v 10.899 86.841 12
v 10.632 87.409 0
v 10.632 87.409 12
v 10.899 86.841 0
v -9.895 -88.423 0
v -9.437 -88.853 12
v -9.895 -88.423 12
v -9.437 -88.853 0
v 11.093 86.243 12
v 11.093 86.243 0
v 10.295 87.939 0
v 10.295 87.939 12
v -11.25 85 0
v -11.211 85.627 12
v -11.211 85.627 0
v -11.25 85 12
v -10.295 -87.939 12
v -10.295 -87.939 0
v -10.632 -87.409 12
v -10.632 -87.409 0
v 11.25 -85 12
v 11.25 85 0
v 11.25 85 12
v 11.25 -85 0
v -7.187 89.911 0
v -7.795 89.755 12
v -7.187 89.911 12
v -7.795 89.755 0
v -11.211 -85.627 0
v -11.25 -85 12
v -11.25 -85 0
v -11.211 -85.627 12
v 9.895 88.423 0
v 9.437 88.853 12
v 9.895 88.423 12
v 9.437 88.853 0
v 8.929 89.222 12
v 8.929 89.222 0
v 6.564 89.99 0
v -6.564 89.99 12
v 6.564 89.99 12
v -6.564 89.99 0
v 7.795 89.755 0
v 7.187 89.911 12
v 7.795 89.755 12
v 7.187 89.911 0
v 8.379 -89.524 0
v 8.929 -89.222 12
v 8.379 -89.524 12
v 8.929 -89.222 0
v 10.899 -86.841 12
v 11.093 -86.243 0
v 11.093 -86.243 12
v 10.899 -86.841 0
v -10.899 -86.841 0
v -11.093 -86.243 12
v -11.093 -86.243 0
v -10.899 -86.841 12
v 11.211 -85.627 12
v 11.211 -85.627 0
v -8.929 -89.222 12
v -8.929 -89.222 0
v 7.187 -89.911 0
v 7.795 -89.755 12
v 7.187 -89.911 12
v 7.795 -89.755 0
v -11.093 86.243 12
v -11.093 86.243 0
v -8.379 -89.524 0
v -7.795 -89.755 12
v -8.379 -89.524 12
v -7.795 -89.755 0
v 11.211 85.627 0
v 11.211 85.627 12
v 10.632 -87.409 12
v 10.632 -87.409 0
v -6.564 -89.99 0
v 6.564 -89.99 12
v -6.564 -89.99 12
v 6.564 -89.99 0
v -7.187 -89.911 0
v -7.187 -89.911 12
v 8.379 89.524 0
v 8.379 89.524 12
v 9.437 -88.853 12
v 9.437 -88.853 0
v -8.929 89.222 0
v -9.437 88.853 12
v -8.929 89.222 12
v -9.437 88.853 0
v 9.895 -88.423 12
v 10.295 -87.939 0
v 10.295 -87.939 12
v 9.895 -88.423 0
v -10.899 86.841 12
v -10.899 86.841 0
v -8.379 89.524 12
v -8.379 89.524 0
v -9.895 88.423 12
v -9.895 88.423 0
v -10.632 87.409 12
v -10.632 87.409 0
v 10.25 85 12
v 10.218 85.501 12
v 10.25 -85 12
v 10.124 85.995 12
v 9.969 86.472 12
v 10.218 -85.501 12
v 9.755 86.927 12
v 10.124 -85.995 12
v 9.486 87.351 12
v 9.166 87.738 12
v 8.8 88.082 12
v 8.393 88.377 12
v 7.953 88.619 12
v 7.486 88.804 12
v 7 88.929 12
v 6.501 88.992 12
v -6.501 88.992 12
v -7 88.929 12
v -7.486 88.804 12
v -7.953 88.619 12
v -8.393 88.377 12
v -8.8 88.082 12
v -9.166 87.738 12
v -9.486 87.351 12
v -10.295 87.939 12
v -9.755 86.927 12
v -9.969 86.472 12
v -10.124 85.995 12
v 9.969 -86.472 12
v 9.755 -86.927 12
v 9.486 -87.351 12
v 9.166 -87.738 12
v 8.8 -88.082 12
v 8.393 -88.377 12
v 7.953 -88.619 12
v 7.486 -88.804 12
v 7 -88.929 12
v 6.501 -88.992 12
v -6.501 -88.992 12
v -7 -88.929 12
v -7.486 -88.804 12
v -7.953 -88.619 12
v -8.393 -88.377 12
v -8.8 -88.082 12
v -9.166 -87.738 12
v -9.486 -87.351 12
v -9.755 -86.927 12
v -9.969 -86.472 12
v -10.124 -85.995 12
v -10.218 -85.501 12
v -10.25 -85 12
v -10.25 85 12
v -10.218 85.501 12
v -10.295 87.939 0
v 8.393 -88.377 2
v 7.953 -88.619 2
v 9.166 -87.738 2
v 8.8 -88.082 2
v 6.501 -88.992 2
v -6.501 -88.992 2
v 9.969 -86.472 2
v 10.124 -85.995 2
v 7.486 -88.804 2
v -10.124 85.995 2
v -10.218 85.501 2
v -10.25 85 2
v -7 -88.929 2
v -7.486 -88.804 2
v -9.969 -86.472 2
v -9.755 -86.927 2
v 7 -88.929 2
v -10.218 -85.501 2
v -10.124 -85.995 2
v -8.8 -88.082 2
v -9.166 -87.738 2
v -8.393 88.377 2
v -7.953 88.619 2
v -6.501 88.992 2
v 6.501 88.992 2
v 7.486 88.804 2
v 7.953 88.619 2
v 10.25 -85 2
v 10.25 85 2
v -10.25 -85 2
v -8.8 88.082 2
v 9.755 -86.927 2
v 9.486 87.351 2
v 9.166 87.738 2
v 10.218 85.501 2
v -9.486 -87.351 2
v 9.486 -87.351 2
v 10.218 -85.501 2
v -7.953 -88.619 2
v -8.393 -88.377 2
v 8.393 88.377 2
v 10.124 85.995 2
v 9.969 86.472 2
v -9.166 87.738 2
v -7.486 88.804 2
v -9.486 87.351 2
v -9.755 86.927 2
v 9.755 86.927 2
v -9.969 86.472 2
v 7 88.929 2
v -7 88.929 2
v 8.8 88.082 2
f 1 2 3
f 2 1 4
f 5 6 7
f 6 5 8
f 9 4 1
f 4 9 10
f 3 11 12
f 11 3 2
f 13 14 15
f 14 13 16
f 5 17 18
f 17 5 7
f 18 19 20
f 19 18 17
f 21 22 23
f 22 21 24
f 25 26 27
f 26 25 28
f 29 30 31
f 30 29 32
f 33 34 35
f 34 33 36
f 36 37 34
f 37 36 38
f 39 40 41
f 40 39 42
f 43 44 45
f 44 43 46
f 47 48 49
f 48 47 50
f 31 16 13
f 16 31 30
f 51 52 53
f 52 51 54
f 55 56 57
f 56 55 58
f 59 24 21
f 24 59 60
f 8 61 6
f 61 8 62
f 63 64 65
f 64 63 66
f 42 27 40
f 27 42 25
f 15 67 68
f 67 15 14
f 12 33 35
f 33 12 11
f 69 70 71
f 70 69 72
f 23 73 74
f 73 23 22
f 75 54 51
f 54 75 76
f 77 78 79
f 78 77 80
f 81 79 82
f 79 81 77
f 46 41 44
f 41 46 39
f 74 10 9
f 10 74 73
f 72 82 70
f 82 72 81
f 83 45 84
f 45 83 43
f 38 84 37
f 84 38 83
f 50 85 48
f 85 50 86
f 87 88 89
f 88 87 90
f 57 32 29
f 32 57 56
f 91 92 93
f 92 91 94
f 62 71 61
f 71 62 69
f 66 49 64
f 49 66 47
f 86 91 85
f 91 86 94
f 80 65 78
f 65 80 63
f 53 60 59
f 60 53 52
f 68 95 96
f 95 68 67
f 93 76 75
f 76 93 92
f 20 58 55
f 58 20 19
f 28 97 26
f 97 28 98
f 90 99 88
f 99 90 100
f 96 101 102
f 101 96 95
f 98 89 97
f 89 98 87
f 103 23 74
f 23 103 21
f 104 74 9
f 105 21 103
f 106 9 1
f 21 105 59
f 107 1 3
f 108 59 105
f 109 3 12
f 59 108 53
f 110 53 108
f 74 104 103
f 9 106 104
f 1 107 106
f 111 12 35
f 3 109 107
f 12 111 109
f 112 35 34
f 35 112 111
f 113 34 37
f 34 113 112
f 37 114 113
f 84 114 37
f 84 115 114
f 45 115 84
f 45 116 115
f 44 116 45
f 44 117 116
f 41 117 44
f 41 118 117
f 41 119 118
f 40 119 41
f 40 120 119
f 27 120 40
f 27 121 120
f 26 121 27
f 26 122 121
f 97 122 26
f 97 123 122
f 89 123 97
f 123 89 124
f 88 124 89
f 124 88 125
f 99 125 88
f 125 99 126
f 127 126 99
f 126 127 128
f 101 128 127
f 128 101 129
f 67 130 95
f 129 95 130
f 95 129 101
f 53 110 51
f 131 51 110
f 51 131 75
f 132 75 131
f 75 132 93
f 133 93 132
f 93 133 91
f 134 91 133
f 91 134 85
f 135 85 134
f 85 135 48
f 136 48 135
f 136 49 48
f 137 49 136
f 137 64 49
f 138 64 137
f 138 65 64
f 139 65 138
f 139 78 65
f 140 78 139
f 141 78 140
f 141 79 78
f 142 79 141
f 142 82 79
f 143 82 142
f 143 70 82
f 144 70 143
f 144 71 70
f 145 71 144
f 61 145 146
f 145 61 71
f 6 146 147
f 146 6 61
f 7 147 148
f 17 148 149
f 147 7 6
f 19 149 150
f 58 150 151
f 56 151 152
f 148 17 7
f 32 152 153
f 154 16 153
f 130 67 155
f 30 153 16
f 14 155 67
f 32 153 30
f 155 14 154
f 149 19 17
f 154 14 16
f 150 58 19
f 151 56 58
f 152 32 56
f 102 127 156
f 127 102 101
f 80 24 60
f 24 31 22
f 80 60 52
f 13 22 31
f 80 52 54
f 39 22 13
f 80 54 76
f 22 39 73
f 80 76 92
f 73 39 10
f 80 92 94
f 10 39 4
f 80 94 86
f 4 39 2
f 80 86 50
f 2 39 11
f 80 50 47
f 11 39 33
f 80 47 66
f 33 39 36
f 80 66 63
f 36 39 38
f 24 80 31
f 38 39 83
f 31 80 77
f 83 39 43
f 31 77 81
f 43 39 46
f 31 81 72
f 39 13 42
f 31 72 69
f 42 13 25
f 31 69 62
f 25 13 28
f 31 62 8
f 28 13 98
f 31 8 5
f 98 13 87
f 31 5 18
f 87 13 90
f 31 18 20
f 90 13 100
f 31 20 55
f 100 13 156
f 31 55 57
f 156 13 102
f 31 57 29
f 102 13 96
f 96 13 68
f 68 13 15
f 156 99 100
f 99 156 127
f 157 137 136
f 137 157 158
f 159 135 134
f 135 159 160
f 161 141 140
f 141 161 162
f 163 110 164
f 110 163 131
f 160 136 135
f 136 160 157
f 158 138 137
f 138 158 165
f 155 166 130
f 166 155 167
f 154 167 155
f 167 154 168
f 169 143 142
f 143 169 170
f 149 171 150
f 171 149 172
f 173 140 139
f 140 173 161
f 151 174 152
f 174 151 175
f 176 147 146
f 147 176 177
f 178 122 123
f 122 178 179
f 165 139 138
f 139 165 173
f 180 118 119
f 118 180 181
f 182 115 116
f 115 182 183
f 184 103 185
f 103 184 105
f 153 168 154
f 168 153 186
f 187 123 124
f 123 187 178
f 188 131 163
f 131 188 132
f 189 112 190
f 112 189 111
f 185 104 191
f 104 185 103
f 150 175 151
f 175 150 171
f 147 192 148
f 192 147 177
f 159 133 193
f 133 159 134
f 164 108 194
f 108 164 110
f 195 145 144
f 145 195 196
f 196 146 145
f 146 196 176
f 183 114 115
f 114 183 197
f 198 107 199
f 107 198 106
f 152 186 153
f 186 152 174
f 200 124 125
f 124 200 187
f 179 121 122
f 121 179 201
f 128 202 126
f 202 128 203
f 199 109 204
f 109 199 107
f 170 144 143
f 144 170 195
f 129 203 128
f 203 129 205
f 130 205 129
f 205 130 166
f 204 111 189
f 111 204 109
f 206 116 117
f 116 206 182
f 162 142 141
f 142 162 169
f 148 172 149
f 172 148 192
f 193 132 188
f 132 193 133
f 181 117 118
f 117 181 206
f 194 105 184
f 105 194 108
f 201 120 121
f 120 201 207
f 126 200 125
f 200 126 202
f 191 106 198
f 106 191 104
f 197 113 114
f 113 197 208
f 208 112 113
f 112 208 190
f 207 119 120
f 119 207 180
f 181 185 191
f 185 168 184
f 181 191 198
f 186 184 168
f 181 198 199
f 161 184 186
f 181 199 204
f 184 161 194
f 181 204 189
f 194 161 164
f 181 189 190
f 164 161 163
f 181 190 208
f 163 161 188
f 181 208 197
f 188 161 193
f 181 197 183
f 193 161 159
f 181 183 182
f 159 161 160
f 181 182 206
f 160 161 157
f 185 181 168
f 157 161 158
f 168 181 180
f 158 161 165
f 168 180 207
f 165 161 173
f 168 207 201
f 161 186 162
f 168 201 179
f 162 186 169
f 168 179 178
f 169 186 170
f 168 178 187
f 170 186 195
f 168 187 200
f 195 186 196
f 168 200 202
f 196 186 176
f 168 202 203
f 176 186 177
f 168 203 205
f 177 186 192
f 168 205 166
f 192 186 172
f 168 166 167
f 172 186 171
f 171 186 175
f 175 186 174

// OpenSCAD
$fn = 50;


difference() {
	union() {
		hull() {
			translate(v = [-6.2500000000, 85.0000000000, 0]) {
				cylinder(h = 12, r = 5);
			}
			translate(v = [6.2500000000, 85.0000000000, 0]) {
				cylinder(h = 12, r = 5);
			}
			translate(v = [-6.2500000000, -85.0000000000, 0]) {
				cylinder(h = 12, r = 5);
			}
			translate(v = [6.2500000000, -85.0000000000, 0]) {
				cylinder(h = 12, r = 5);
			}
		}
	}
	union() {
		translate(v = [0, 0, 2]) {
			hull() {
				translate(v = [-6.2500000000, 85.0000000000, 0]) {
					cylinder(h = 10, r = 4);
				}
				translate(v = [6.2500000000, 85.0000000000, 0]) {
					cylinder(h = 10, r = 4);
				}
				translate(v = [-6.2500000000, -85.0000000000, 0]) {
					cylinder(h = 10, r = 4);
				}
				translate(v = [6.2500000000, -85.0000000000, 0]) {
					cylinder(h = 10, r = 4);
				}
			}
		}
	}
}
